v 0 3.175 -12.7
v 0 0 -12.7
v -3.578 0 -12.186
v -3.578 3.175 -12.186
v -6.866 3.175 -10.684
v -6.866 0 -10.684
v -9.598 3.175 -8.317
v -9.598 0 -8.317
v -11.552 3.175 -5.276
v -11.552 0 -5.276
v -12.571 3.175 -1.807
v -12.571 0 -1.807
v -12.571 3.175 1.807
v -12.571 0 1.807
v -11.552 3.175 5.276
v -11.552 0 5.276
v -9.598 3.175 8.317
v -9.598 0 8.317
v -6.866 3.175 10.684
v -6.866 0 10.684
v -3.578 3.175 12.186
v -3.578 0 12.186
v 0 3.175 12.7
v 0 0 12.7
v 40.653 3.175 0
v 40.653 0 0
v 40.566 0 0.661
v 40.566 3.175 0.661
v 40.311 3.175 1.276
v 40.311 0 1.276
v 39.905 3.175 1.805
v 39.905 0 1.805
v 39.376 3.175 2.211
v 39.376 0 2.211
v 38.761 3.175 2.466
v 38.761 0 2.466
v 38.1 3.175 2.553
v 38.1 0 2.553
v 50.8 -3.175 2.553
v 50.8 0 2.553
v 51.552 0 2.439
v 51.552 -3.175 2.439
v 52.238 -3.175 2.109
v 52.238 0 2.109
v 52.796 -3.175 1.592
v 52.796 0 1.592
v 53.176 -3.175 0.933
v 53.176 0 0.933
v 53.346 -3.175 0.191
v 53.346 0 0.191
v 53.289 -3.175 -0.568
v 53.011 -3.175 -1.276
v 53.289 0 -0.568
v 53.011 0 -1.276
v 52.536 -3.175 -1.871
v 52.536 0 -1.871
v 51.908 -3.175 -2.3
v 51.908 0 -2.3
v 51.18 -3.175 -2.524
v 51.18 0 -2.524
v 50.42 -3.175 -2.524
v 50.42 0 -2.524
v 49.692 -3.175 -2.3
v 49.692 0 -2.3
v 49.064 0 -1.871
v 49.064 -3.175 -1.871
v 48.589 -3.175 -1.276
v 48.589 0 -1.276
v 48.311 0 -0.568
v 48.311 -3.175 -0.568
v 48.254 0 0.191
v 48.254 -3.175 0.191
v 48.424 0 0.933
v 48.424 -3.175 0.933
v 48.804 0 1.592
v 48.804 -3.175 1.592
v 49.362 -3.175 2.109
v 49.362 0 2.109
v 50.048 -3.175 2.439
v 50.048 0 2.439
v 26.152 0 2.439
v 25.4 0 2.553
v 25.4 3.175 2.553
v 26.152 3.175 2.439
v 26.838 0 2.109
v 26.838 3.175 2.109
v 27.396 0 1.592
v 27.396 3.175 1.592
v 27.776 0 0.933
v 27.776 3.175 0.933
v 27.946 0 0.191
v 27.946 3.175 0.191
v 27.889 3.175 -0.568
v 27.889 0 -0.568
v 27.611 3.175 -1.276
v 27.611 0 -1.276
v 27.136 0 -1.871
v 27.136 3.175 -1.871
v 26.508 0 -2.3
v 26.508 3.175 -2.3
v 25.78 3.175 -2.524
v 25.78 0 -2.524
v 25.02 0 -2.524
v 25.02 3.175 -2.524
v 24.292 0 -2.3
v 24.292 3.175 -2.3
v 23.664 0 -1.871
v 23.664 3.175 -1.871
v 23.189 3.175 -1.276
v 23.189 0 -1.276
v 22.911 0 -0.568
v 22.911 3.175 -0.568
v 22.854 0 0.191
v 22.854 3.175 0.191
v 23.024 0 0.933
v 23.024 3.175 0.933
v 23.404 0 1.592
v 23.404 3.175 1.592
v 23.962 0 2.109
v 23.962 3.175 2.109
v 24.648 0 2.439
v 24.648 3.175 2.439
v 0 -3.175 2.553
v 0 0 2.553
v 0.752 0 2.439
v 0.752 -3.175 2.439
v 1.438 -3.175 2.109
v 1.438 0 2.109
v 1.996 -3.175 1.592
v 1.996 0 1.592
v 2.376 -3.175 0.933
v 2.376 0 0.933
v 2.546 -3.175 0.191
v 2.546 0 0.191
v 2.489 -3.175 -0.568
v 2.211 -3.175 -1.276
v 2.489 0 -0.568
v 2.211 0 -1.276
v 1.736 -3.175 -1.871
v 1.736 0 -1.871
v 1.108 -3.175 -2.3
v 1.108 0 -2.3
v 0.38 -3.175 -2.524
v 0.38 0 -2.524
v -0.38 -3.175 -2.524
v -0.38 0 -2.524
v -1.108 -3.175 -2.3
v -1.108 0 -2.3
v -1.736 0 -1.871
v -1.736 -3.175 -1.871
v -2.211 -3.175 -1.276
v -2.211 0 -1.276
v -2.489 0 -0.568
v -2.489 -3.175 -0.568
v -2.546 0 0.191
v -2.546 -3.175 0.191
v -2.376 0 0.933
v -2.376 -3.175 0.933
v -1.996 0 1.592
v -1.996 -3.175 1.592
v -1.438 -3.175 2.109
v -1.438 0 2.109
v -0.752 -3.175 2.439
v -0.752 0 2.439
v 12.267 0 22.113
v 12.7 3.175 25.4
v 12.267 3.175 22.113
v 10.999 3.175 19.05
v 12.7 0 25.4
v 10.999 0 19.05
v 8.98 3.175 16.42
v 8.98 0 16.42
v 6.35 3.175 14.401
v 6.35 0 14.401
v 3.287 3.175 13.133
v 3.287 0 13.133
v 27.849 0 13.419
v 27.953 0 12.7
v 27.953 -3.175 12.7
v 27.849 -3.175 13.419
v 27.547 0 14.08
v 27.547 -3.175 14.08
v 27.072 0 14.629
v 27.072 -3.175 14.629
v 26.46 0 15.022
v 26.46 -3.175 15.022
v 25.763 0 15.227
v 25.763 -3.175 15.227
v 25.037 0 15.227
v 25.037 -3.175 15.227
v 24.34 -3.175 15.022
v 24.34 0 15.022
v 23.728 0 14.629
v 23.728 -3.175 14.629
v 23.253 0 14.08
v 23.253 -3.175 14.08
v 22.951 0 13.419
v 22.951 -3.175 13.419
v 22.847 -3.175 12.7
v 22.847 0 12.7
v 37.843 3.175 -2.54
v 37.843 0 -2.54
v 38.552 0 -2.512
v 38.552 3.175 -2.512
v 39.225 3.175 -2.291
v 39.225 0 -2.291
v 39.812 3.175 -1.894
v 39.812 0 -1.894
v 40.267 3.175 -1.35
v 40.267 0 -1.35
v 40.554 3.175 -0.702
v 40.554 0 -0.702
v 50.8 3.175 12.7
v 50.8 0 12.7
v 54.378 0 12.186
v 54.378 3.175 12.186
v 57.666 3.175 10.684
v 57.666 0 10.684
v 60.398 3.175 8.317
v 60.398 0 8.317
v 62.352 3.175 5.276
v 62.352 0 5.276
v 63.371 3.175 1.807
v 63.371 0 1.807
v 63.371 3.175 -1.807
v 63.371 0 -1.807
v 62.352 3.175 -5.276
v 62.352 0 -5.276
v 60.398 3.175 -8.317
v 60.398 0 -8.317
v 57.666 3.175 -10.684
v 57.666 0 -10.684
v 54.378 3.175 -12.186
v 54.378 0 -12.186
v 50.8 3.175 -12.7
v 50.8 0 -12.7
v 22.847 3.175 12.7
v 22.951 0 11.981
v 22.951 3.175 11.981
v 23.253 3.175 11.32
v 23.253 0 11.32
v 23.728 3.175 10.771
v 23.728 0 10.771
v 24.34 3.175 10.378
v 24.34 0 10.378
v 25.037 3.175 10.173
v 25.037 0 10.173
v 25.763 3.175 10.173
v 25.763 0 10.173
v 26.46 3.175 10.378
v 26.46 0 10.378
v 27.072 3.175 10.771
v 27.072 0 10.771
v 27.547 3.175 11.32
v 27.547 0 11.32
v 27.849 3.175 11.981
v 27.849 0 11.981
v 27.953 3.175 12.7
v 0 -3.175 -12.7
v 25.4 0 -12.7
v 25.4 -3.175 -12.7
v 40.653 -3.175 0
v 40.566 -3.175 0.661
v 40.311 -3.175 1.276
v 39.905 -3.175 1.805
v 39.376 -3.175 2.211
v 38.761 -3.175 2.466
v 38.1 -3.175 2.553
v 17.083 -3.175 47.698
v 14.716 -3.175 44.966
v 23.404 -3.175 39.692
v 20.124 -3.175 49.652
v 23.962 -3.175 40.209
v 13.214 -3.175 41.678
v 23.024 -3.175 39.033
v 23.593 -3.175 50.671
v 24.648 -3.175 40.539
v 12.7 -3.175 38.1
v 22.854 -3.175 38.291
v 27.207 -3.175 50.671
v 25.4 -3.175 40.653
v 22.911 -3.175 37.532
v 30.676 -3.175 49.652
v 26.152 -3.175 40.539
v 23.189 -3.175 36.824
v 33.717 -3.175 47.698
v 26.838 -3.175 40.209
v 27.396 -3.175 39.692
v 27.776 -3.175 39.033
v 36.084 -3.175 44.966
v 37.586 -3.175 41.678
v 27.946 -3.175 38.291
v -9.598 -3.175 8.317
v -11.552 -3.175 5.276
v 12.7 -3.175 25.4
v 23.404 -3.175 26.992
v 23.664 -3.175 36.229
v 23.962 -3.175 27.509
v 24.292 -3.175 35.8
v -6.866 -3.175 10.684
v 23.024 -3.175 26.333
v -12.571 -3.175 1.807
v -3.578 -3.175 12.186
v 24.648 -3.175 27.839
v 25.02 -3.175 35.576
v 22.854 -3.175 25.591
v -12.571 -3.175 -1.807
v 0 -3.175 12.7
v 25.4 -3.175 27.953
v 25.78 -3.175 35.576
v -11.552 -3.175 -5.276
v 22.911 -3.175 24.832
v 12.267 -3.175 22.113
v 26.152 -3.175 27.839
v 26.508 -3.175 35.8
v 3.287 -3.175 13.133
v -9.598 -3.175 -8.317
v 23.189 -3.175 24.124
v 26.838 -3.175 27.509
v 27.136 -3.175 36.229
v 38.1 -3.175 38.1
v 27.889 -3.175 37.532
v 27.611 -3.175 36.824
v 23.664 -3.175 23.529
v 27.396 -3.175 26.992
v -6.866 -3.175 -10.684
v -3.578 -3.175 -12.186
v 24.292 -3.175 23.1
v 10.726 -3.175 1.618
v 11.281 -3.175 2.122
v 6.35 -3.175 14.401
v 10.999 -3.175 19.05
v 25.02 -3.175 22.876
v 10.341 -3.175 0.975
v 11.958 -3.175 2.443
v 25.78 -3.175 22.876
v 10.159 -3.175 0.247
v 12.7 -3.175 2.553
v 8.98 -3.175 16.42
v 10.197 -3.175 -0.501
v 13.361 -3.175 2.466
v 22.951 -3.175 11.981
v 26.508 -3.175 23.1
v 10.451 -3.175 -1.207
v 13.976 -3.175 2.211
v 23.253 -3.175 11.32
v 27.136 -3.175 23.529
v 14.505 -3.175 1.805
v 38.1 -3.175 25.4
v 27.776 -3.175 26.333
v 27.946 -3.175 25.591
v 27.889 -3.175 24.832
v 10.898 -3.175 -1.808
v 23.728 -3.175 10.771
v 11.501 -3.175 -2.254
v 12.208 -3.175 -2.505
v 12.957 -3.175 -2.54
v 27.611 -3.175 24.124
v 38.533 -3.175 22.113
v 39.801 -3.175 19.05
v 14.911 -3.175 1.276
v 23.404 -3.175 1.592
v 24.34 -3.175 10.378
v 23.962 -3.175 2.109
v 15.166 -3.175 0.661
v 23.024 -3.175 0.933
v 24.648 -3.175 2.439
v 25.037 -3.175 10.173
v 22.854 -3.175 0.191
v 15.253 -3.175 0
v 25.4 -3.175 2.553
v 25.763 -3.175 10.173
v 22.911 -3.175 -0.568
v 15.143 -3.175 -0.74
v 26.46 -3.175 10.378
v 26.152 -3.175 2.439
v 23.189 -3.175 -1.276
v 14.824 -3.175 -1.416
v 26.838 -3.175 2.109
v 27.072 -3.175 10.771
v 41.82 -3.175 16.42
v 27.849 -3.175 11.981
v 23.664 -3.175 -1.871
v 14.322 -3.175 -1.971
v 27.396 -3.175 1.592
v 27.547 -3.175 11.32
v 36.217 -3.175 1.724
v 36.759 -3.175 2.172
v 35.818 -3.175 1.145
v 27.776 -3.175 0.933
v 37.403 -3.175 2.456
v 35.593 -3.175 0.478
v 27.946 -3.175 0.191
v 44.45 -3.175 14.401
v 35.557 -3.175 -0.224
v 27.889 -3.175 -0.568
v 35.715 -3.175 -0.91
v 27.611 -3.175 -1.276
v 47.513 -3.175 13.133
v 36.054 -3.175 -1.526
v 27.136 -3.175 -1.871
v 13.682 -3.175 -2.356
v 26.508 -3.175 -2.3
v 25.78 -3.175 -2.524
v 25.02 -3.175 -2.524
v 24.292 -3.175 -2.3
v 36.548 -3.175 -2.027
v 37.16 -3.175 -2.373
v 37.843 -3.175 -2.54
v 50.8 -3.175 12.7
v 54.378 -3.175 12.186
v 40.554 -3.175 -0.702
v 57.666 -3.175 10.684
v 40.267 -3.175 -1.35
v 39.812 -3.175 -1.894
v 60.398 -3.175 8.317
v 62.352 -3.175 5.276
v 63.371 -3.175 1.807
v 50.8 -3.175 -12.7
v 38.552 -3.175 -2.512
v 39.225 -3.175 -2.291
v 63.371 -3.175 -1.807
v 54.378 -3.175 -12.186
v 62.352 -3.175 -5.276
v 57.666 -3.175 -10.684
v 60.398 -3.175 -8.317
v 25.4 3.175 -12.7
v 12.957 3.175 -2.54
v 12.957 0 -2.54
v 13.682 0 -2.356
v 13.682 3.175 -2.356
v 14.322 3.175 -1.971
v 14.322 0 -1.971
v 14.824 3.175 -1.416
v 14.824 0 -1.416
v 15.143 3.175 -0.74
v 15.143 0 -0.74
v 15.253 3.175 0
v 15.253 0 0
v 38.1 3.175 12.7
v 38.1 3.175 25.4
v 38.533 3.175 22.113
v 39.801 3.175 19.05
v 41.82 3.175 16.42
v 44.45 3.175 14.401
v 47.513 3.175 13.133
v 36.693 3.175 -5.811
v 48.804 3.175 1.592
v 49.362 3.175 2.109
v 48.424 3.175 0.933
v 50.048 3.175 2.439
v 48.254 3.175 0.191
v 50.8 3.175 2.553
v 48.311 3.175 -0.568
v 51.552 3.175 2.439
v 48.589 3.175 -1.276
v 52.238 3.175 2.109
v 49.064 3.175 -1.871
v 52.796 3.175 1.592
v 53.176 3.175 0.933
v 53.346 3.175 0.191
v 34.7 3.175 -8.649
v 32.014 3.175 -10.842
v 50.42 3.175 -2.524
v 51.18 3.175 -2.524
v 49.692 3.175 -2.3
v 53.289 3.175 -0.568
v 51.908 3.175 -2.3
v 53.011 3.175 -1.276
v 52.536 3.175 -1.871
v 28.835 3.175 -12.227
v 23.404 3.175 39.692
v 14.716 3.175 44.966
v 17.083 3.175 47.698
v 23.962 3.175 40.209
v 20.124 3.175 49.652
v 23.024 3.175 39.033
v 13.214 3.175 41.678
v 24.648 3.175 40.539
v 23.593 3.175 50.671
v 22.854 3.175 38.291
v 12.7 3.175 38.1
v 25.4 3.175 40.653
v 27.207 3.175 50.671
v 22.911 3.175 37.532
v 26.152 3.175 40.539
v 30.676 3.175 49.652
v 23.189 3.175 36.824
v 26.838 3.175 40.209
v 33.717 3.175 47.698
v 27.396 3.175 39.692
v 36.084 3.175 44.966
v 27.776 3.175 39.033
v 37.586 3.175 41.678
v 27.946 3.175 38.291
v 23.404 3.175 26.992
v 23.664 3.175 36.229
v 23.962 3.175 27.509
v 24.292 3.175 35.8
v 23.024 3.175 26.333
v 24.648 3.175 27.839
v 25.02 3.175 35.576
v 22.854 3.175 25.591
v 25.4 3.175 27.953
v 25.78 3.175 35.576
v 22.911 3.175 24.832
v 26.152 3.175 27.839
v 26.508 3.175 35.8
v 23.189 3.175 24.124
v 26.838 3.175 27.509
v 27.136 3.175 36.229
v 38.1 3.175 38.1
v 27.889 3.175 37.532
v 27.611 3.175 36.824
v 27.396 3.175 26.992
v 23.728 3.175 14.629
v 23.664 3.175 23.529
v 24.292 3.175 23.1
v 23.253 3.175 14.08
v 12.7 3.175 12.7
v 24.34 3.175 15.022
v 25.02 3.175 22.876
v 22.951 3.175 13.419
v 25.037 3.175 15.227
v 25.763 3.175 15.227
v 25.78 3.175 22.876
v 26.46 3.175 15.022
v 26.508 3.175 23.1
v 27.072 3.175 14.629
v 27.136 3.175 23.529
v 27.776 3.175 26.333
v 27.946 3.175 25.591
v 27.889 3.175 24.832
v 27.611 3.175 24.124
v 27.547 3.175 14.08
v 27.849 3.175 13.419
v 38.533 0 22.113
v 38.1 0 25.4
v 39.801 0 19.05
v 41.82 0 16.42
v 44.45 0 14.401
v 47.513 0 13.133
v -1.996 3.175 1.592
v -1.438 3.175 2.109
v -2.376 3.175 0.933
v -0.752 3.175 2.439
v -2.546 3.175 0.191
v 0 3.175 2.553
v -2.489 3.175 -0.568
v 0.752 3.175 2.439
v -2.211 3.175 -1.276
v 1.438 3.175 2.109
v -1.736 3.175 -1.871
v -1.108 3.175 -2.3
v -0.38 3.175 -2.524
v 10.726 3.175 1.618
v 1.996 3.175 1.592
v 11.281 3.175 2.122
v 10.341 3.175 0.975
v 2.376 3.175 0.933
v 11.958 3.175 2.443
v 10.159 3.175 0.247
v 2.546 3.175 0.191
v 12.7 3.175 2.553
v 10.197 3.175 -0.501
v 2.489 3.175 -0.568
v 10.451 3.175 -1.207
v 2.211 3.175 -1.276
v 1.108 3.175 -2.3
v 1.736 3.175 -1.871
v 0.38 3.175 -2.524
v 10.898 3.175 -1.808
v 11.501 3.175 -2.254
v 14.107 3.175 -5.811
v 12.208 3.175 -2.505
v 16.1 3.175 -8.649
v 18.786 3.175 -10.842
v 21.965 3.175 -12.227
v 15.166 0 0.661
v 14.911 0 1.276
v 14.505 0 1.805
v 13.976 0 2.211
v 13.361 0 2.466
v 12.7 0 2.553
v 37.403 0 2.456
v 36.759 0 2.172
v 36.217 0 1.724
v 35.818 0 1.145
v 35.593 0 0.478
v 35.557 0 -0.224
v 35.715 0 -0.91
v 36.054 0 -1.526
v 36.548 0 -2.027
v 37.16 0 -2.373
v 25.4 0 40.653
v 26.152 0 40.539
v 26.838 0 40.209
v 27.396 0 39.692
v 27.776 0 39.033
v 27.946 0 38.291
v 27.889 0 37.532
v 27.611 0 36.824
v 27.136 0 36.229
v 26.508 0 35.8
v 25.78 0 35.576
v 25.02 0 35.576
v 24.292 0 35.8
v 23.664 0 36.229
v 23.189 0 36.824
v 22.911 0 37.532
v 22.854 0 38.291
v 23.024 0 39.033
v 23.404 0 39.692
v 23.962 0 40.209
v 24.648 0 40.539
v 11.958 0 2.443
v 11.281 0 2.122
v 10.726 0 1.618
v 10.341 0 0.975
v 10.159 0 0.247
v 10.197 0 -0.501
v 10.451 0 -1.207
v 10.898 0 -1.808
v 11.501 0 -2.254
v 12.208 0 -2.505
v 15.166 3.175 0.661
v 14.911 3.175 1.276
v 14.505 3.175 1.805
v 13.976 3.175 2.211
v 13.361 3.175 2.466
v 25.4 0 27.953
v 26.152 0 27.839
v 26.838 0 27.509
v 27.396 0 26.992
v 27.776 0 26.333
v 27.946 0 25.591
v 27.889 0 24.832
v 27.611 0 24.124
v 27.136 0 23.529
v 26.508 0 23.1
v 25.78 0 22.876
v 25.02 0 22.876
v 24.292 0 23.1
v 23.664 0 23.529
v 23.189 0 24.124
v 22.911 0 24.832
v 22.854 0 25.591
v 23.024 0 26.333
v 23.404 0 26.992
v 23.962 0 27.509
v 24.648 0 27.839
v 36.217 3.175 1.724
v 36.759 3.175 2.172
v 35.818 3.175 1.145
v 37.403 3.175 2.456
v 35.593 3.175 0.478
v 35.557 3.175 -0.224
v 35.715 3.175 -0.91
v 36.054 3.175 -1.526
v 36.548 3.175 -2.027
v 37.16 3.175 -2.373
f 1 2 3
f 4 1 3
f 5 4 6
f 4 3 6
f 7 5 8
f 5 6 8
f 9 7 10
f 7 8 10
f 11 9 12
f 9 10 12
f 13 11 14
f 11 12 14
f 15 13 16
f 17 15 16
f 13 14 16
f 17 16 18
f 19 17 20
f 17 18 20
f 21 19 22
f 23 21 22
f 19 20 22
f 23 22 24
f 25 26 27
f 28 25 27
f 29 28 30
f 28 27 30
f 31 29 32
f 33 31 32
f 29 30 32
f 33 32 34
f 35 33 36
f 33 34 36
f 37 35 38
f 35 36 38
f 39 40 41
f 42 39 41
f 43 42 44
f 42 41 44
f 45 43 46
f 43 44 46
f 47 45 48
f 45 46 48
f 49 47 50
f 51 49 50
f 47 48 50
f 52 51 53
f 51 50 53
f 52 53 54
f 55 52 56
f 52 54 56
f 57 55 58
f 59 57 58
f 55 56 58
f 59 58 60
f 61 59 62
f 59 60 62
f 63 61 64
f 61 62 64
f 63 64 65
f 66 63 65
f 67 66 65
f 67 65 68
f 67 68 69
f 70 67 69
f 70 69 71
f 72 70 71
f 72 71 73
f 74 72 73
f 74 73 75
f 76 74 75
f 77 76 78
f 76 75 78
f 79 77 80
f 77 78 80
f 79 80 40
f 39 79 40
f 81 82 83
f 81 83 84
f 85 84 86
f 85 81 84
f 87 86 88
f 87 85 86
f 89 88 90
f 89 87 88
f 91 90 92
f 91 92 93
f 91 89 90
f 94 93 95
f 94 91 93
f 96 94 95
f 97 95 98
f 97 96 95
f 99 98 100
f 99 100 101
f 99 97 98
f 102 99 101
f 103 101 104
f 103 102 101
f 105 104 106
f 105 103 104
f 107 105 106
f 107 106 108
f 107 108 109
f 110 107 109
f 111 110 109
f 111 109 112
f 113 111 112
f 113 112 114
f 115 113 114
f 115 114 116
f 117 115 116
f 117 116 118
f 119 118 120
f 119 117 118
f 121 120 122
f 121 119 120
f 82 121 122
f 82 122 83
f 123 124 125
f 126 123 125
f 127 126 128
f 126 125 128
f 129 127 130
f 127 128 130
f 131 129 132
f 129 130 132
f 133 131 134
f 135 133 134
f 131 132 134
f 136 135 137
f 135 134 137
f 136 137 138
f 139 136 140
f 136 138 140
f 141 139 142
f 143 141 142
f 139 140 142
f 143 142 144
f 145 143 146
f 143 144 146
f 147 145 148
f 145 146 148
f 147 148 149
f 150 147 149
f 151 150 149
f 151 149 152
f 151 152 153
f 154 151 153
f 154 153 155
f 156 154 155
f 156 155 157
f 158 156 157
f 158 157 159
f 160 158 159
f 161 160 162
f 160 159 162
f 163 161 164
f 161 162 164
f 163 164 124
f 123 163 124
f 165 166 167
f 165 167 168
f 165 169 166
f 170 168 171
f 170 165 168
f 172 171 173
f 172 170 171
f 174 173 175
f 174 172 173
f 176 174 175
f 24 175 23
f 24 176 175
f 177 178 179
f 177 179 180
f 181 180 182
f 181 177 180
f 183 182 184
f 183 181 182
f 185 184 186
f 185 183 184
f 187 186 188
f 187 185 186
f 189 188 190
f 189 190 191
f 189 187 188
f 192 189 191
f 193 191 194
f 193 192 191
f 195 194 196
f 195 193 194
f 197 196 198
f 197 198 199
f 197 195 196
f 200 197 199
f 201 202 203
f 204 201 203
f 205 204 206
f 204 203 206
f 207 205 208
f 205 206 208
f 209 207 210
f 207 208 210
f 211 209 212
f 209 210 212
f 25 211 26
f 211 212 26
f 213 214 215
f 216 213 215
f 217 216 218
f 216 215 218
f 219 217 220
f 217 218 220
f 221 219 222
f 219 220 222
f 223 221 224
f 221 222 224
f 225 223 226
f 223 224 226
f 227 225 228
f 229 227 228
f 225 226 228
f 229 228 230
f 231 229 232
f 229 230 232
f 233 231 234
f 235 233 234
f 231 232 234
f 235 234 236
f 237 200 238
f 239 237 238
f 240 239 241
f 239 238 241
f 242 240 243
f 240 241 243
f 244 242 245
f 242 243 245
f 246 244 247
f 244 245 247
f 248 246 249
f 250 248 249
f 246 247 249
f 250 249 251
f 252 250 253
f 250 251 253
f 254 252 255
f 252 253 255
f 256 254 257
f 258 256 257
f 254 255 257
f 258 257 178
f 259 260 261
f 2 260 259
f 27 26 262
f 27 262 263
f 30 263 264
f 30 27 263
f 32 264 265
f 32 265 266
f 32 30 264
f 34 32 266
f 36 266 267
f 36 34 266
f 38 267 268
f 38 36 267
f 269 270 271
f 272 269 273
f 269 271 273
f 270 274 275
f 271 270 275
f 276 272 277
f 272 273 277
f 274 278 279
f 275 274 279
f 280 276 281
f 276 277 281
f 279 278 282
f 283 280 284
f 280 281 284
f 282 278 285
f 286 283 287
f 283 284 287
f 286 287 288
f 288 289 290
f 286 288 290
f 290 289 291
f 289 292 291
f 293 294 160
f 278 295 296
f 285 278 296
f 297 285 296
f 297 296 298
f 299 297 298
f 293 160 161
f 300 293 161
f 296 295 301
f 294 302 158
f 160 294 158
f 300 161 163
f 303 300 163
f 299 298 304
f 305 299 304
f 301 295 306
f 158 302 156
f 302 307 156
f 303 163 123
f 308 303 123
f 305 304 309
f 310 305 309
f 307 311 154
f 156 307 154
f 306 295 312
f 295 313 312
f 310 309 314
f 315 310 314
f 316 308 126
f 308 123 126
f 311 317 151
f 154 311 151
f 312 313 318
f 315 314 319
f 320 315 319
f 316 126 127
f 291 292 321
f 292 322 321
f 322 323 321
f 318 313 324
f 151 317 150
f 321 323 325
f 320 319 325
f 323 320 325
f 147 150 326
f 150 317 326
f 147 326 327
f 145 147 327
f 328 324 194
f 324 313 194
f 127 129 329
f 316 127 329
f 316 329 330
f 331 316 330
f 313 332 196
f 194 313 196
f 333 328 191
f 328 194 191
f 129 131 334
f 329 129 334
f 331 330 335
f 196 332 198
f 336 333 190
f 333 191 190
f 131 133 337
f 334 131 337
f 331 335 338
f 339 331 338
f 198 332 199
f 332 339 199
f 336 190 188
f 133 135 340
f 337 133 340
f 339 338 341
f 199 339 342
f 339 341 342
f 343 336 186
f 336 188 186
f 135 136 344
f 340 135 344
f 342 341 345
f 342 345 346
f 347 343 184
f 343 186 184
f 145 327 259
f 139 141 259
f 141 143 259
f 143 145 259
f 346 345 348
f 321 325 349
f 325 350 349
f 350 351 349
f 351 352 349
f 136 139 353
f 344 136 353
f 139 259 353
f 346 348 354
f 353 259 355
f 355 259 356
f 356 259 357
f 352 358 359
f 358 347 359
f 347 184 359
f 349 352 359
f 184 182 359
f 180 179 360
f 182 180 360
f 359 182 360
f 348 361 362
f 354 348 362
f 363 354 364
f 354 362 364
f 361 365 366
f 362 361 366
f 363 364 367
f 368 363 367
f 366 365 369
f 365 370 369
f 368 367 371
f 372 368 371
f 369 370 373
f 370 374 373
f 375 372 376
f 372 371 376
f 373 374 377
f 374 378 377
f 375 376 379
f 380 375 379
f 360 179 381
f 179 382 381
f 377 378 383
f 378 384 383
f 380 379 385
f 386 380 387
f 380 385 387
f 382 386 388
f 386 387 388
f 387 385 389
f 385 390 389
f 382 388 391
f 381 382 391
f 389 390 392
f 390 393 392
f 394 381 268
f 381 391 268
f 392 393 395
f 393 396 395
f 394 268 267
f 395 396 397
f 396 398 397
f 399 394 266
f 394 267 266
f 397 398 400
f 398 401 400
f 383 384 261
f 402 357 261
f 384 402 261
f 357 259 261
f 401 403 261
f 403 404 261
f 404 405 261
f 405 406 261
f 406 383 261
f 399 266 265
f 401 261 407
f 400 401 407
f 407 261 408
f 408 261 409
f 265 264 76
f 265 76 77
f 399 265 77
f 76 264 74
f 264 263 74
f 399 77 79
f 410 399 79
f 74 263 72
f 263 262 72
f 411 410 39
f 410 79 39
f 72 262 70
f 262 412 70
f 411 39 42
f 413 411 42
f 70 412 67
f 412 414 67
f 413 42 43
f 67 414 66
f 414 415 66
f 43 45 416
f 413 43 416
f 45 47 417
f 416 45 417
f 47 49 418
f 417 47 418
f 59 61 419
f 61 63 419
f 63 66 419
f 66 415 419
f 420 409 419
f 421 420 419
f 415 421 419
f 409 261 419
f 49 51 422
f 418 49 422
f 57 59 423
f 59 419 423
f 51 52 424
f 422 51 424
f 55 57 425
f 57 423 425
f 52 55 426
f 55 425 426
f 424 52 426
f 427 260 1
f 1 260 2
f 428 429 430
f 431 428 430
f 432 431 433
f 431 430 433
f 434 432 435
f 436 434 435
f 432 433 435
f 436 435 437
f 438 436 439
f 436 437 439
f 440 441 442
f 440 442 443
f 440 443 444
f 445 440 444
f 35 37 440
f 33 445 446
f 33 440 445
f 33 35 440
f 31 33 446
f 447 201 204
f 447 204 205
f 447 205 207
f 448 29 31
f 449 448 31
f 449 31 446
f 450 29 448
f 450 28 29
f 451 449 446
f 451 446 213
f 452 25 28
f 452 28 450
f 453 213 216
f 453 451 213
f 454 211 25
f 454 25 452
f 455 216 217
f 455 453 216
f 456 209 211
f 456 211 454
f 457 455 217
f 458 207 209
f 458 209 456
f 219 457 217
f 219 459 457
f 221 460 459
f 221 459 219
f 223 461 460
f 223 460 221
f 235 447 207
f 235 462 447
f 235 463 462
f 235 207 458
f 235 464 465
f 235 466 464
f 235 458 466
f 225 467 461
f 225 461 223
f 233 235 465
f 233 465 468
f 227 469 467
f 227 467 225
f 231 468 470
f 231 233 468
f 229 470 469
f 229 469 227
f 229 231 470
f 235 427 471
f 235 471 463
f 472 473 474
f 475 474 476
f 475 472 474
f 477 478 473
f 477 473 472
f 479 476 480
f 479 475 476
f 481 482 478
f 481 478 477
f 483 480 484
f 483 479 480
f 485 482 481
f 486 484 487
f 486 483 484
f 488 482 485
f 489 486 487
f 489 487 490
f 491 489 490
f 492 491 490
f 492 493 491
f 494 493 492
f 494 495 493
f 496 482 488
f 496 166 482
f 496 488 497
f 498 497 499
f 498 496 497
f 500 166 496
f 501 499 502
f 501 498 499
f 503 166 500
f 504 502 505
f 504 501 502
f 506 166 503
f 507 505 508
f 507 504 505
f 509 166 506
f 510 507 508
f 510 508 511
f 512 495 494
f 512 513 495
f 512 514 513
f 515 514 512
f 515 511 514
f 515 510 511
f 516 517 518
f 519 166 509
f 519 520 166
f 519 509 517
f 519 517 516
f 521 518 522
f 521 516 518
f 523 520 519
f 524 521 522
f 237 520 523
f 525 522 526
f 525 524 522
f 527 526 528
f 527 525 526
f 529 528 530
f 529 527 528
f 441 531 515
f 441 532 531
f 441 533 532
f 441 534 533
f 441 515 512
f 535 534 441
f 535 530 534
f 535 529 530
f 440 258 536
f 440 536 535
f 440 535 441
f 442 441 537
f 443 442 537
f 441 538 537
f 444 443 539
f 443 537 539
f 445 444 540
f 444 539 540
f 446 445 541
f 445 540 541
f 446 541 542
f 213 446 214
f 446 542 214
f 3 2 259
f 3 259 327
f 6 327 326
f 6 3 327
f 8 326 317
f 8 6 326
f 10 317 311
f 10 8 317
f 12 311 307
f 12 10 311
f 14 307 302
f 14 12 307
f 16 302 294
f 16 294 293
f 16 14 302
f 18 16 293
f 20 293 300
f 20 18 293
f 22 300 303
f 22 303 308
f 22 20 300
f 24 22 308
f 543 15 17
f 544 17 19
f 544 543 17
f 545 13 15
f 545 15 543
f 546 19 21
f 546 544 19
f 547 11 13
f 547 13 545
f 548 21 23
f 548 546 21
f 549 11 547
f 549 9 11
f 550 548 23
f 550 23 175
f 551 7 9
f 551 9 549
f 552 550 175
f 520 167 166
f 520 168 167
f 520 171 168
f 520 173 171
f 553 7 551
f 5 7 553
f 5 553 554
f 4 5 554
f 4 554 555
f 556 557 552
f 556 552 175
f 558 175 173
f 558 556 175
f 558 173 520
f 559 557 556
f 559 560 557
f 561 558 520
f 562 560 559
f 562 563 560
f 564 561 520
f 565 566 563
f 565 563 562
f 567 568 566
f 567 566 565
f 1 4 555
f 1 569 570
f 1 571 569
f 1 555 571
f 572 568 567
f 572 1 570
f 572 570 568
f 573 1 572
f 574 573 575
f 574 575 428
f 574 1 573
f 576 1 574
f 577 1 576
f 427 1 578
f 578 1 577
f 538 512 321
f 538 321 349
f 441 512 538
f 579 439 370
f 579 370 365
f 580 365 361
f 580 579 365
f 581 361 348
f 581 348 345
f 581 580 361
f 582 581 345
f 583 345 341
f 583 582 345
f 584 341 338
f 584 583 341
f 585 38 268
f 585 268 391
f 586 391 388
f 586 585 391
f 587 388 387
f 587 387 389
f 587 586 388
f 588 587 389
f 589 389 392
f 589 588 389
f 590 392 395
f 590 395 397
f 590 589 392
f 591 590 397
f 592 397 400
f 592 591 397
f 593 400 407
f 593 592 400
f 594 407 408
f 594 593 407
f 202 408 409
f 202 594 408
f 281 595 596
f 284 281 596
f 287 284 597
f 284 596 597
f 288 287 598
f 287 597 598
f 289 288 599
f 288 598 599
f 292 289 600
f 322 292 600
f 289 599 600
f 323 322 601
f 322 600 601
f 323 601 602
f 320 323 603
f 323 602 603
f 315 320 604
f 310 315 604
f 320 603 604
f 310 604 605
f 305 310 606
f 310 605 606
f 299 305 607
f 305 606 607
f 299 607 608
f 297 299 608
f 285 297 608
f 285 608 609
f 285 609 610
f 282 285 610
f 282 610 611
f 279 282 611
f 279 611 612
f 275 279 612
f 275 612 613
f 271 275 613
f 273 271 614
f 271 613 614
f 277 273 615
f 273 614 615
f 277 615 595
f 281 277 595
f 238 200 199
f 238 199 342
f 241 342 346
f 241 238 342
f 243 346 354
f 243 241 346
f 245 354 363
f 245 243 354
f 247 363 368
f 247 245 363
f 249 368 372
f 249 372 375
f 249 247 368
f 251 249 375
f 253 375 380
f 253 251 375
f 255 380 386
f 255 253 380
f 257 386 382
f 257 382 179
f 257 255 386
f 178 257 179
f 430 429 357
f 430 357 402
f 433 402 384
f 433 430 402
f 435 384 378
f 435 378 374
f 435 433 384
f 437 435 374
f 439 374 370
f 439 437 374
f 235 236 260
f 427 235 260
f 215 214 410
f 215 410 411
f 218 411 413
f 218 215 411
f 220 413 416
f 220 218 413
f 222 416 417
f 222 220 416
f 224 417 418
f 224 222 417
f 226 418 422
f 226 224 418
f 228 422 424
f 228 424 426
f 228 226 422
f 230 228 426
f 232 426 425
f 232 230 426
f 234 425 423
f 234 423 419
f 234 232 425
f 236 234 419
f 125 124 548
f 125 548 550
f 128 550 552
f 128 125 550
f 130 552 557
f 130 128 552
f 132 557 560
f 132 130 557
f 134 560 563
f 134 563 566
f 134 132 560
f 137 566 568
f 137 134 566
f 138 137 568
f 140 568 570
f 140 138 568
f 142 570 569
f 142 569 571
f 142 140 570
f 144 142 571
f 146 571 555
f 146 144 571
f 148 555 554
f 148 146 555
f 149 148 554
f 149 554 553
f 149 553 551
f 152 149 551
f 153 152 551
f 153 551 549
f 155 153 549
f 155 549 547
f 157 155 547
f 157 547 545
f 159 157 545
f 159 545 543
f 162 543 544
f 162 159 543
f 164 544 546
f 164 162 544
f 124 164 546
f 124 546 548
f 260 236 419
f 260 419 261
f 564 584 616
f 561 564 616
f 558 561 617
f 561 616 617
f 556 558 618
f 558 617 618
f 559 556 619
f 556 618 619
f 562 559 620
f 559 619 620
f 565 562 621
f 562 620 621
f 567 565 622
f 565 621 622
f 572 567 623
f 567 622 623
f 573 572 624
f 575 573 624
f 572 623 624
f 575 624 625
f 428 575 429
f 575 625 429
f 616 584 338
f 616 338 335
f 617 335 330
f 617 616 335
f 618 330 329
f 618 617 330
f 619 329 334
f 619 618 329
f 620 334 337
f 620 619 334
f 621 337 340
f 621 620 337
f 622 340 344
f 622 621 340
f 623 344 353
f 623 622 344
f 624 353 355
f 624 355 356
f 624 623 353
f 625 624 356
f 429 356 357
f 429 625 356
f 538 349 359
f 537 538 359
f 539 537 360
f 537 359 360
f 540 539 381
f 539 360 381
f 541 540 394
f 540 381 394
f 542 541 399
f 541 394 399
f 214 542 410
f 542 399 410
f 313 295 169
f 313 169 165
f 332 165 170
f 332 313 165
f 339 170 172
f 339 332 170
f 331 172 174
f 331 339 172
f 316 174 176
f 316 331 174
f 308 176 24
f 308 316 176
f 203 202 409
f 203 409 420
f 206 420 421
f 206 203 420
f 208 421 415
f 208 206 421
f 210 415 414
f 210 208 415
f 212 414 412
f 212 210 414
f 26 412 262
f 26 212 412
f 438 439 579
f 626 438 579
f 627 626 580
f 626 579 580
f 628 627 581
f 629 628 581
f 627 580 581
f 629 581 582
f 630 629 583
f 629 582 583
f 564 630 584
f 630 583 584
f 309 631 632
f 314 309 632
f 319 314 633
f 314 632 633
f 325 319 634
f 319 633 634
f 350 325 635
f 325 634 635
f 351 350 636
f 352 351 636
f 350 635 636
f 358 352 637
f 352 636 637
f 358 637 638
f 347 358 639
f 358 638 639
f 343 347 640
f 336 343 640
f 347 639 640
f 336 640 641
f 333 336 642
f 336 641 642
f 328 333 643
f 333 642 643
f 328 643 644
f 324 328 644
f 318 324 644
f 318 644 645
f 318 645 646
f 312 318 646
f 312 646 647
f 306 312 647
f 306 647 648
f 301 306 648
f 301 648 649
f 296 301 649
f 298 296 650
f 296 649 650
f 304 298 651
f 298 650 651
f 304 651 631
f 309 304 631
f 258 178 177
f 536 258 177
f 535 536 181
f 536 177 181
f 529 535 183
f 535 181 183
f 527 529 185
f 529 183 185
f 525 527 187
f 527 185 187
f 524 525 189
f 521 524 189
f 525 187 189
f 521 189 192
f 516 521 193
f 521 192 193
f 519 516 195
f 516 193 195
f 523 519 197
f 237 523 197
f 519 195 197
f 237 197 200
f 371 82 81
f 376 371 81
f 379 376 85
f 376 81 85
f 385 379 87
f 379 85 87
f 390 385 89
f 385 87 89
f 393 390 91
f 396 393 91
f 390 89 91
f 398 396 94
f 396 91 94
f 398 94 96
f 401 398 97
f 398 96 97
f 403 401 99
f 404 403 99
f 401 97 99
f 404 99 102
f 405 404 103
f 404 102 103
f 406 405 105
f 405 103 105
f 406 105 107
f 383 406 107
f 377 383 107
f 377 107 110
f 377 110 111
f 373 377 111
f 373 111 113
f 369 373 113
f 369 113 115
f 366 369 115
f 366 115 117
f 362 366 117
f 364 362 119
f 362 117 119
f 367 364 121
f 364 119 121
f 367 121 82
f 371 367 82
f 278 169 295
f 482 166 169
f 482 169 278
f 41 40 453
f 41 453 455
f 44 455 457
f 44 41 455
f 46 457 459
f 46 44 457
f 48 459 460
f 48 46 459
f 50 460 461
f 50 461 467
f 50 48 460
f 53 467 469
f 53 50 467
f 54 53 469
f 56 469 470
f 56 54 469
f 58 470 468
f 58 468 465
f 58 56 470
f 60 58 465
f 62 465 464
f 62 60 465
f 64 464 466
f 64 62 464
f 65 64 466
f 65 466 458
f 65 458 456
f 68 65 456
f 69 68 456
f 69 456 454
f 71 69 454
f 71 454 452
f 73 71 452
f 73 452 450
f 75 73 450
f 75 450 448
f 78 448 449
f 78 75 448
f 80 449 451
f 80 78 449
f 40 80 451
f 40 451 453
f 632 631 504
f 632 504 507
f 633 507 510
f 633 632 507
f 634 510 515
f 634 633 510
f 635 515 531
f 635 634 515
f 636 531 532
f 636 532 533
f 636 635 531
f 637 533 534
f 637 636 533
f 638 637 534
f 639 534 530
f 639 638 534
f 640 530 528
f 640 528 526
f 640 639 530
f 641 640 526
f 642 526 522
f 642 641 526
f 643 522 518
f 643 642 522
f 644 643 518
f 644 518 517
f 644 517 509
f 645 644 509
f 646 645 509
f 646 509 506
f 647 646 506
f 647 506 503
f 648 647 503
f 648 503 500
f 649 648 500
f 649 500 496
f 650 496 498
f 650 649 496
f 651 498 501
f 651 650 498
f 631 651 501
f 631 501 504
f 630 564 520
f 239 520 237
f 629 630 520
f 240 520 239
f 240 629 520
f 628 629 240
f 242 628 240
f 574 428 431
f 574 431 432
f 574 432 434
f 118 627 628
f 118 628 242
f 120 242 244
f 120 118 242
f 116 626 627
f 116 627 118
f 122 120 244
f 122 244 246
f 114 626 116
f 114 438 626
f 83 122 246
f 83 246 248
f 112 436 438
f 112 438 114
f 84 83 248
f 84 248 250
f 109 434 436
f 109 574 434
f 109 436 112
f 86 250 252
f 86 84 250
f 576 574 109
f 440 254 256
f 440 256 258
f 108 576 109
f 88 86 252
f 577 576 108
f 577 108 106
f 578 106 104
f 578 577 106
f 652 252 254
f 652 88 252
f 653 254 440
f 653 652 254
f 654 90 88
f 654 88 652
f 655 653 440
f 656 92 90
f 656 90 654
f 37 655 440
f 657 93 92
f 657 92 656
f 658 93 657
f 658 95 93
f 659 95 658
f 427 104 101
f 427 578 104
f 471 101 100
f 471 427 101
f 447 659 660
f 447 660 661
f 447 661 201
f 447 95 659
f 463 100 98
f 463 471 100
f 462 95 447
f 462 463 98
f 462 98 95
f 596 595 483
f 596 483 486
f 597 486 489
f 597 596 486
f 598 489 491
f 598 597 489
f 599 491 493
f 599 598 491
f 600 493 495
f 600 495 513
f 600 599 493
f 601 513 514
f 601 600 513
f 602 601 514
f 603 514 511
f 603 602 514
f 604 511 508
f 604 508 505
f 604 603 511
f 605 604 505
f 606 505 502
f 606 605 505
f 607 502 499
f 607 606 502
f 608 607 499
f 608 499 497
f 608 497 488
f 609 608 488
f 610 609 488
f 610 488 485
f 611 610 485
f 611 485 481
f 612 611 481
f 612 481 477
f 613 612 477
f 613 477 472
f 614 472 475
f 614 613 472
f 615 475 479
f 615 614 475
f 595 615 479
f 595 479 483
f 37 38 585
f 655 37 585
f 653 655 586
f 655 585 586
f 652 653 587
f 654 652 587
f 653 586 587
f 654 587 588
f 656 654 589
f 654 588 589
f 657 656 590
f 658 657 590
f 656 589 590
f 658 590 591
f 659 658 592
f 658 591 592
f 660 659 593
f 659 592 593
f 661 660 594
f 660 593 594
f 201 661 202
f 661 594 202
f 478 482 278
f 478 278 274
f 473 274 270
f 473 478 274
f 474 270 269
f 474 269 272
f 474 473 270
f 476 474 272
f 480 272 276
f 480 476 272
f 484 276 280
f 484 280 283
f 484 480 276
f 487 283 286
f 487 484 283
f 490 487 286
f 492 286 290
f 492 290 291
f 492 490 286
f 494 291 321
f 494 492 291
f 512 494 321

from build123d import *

# Parameters (mm, degrees)
SKETCH1_R           = 2.5527
BOSS_EXTRUDE1_DEPTH = 3.175
FILLET1_R           = 12.7


with BuildPart() as part:
    # Sketch1 → Boss-Extrude1 (new, symmetric)
    # profile 1 of 4: a face of its own
    with BuildSketch(Plane(origin=(0, 0, 0), x_dir=(1, 0, 0), z_dir=(0, 1, 0))):
        with BuildLine():
            Line((25.4, 12.7), (0, 12.7))
            ThreePointArc((0, 12.7), (-12.7, 0), (0, -12.7))
            Line((0, -12.7), (12.7, -12.7))
            Line((12.7, -12.7), (12.7, -2.5527))
            ThreePointArc((12.7, -2.5527), (10.15053309, 0.128435844), (12.95654635, 2.539775829))
            ThreePointArc((12.95654635, 2.539775829), (17.367726132, 9.837305348), (25.4, 12.7))
        make_face()
        with Locations(Location((0, 0, 0), (0, 0, 270))):
            Circle(SKETCH1_R, mode=Mode.SUBTRACT)
    # profile 2 of 4: a face of its own
    with BuildSketch(Plane(origin=(0, 0, 0), x_dir=(1, 0, 0), z_dir=(0, 1, 0))):
        with BuildLine():
            ThreePointArc((37.84345365, 2.539775829), (33.432273868, 9.837305348), (25.4, 12.7))
            ThreePointArc((25.4, 12.7), (17.367726132, 9.837305348), (12.95654635, 2.539775829))
            ThreePointArc((12.95654635, 2.539775829), (14.593563196, 1.711927484), (15.2527, 0))
            ThreePointArc((15.2527, 0), (14.50503148, -1.80503148), (12.7, -2.5527))
            Line((12.7, -2.5527), (12.7, -12.7))
            Line((12.7, -12.7), (22.8473, -12.7))
            ThreePointArc((22.8473, -12.7), (25.4, -10.1473), (27.9527, -12.7))
            Line((27.9527, -12.7), (38.1, -12.7))
            Line((38.1, -12.7), (38.1, -2.5527))
            ThreePointArc((38.1, -2.5527), (35.55053309, -0.128435844), (37.84345365, 2.539775829))
        make_face()
        with Locations(Location((25.4, 0, 0), (0, 0, 270))):
            Circle(SKETCH1_R, mode=Mode.SUBTRACT)
    # profile 3 of 4: a face of its own
    with BuildSketch(Plane(origin=(0, 0, 0), x_dir=(1, 0, 0), z_dir=(0, 1, 0))):
        with BuildLine():
            Line((50.8, 12.7), (25.4, 12.7))
            ThreePointArc((25.4, 12.7), (33.432273868, 9.837305348), (37.84345365, 2.539775829))
            ThreePointArc((37.84345365, 2.539775829), (39.811927484, 1.893563196), (40.6527, 0))
            ThreePointArc((40.6527, 0), (39.90503148, -1.80503148), (38.1, -2.5527))
            Line((38.1, -2.5527), (38.1, -12.7))
            Line((38.1, -12.7), (50.8, -12.7))
            ThreePointArc((50.8, -12.7), (63.5, 0), (50.8, 12.7))
        make_face()
        with Locations(Location((50.8, 0, 0), (0, 0, 270))):
            Circle(SKETCH1_R, mode=Mode.SUBTRACT)
    # profile 4 of 4: a face of its own
    with BuildSketch(Plane(origin=(0, 0, 0), x_dir=(1, 0, 0), z_dir=(0, 1, 0))):
        with BuildLine():
            Line((22.8473, -12.7), (12.7, -12.7))
            Line((12.7, -12.7), (12.7, -38.1))
            ThreePointArc((12.7, -38.1), (25.4, -50.8), (38.1, -38.1))
            Line((38.1, -38.1), (38.1, -12.7))
            Line((38.1, -12.7), (27.9527, -12.7))
            ThreePointArc((27.9527, -12.7), (25.4, -15.2527), (22.8473, -12.7))
        make_face()
        with Locations(Location((25.4, -38.1, 0), (0, 0, 270))):
            Circle(SKETCH1_R, mode=Mode.SUBTRACT)
        with Locations(Location((25.4, -25.4, 0), (0, 0, 270))):
            Circle(SKETCH1_R, mode=Mode.SUBTRACT)
    extrude(amount=BOSS_EXTRUDE1_DEPTH, both=True)

    # Fillet1
    fillet1_edges = [part.edges().sort_by_distance(p)[0] for p in [
        (12.7, 0, 12.7),
        (38.1, 0, 12.7),
    ]]
    fillet(fillet1_edges, radius=FILLET1_R - 0.0001)  # a hair under: the kernel refuses the full size


solid = part.part
